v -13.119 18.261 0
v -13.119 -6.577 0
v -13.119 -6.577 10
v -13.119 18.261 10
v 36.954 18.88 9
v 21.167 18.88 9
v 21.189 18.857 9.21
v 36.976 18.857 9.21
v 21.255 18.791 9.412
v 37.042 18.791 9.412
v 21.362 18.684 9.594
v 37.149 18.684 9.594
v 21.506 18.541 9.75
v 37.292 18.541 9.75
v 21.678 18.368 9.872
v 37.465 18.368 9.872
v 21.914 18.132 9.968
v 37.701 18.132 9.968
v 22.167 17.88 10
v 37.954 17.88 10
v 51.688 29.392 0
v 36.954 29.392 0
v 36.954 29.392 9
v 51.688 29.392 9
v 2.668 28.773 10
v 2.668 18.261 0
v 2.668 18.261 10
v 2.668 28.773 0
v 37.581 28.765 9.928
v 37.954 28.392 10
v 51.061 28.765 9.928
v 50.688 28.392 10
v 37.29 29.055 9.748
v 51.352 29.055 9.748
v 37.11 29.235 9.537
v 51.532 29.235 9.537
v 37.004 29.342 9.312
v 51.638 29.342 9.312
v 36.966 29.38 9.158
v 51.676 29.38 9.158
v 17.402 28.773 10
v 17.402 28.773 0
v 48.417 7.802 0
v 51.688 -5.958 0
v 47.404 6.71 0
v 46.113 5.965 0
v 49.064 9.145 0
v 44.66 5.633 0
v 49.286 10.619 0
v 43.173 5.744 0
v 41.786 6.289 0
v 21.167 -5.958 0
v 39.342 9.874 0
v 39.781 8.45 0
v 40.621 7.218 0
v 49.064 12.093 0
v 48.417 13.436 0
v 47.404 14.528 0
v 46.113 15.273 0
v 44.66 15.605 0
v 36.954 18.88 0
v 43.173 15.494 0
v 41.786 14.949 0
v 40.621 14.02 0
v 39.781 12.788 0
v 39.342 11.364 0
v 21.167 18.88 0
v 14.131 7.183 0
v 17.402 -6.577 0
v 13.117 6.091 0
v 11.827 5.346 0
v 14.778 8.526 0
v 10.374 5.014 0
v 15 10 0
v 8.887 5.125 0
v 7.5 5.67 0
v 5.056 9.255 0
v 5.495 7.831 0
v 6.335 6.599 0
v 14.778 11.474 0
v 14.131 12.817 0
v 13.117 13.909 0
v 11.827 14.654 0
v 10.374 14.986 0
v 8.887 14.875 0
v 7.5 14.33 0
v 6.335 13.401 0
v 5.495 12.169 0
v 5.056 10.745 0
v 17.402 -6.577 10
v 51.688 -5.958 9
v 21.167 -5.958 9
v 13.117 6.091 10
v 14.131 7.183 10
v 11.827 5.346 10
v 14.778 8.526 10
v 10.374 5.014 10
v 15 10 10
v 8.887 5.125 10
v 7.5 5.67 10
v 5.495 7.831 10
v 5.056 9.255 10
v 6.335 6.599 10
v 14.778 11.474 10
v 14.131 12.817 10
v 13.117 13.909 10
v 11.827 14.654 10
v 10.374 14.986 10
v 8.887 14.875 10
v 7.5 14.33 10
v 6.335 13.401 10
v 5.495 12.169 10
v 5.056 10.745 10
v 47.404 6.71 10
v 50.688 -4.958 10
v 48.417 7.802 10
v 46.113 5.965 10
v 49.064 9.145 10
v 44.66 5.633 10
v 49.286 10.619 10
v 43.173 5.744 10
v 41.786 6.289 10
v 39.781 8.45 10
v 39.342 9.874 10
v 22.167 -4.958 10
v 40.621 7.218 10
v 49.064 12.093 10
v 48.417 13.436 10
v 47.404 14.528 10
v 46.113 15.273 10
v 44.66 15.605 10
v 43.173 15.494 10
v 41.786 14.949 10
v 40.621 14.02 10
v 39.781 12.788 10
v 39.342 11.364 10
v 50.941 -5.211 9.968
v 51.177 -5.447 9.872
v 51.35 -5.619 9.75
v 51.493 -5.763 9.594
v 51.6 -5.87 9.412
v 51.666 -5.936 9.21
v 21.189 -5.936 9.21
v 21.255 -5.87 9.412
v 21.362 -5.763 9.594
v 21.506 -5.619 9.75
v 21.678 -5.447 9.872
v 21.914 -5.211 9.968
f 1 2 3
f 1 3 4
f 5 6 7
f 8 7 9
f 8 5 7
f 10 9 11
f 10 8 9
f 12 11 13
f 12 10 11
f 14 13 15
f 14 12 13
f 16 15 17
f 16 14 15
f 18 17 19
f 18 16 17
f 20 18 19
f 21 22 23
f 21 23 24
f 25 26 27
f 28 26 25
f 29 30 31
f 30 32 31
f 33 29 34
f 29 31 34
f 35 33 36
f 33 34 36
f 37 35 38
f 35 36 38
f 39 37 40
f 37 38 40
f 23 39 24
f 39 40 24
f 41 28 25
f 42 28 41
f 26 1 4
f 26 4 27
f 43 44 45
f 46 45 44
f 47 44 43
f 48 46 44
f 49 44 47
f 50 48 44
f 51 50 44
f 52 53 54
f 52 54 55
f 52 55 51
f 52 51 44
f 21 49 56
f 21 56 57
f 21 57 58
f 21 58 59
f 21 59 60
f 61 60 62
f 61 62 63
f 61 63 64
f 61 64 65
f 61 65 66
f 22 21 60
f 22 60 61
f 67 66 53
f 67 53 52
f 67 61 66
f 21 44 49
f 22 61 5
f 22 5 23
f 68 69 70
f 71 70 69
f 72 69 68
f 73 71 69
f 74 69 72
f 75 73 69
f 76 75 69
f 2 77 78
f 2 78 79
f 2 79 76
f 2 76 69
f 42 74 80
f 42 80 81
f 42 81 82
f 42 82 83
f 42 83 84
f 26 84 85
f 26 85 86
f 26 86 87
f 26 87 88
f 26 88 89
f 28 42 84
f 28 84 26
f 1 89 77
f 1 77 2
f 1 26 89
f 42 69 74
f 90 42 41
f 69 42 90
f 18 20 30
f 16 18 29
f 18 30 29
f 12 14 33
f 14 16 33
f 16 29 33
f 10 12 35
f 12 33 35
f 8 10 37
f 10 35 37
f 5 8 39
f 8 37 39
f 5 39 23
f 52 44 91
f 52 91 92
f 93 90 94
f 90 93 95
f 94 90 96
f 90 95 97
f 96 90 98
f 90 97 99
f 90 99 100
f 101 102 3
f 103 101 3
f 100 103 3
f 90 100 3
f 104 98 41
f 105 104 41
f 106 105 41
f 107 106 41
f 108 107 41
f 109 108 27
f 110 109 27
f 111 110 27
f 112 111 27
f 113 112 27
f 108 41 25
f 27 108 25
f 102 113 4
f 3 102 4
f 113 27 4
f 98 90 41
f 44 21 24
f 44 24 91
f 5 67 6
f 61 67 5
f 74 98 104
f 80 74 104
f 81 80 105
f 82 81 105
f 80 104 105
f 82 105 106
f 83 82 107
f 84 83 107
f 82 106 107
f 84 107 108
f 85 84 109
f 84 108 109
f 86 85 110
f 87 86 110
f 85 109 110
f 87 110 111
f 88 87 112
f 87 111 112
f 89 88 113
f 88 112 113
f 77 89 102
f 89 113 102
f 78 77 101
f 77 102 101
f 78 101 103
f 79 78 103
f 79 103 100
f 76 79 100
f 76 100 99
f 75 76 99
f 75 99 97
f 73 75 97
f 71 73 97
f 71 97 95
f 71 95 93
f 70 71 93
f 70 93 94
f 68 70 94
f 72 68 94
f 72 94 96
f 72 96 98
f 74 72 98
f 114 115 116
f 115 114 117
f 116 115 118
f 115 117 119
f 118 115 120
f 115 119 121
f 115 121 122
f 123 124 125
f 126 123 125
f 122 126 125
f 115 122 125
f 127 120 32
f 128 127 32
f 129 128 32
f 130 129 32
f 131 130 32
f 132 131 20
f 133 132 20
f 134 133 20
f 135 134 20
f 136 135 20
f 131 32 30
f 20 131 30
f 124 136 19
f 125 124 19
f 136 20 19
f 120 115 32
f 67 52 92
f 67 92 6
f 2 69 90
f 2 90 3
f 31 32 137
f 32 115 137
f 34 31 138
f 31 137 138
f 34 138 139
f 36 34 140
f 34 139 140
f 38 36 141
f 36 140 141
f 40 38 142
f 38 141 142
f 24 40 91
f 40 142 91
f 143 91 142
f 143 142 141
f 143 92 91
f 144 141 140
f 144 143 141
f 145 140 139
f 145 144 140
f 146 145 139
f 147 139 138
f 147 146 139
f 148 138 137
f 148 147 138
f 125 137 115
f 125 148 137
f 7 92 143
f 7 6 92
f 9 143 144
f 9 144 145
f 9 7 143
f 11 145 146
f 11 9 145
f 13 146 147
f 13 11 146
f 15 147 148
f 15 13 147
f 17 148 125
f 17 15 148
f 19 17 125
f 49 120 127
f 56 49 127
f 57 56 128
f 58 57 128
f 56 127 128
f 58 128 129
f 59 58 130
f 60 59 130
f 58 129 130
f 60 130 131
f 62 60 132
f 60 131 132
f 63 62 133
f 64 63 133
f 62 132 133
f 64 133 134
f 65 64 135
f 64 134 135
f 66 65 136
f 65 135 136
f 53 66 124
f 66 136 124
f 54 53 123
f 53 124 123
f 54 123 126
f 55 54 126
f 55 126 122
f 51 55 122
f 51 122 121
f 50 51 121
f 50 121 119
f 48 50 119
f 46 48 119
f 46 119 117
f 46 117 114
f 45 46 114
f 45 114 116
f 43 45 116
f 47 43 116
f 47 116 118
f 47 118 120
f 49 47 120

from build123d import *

# Parameters (mm, degrees)
PAD_DEPTH    = 10
SKETCH001_R  = 5
POCKET_DEPTH = 10.001
FILLET_R     = 1


with BuildPart() as pocket:
    # Sketch → Pad (new body)
    with BuildSketch(Plane.XY):
        Polygon((-13.119188, -6.577201), (-13.119188, 18.260599), (2.667712, 18.260599), (2.667712, 28.773099), (17.402212, 28.773099), (17.402212, -6.577201), align=None)
    extrude(amount=PAD_DEPTH)

    # Sketch001 → Pocket (cut, through all)
    with BuildSketch(Plane.XY.offset(10)):
        with Locations((10, 10)):
            Circle(SKETCH001_R)
    extrude(amount=-POCKET_DEPTH, mode=Mode.SUBTRACT)


with BuildPart() as fillet_body:
    # Clone base: copy of Pocket
    add(pocket.part)


with BuildPart() as fillet_body_1:
    # Clone placement: moved
    add(fillet_body.part.moved(Location((34.286051, 0.619013, 0))))

    # Fillet
    fillet_edges = [fillet_body_1.edges().sort_by_distance(p)[0] for p in [
        (21.166863, 6.460712, 10),
        (36.427563, -5.958188, 10),
        (29.060313, 18.879612, 10),
        (51.688263, 11.716962, 10),
        (36.953763, 24.135862, 10),
        (44.321013, 29.392112, 10),
    ]]
    fillet(fillet_edges, radius=FILLET_R)


solid = Compound([pocket.part, fillet_body_1.part])
